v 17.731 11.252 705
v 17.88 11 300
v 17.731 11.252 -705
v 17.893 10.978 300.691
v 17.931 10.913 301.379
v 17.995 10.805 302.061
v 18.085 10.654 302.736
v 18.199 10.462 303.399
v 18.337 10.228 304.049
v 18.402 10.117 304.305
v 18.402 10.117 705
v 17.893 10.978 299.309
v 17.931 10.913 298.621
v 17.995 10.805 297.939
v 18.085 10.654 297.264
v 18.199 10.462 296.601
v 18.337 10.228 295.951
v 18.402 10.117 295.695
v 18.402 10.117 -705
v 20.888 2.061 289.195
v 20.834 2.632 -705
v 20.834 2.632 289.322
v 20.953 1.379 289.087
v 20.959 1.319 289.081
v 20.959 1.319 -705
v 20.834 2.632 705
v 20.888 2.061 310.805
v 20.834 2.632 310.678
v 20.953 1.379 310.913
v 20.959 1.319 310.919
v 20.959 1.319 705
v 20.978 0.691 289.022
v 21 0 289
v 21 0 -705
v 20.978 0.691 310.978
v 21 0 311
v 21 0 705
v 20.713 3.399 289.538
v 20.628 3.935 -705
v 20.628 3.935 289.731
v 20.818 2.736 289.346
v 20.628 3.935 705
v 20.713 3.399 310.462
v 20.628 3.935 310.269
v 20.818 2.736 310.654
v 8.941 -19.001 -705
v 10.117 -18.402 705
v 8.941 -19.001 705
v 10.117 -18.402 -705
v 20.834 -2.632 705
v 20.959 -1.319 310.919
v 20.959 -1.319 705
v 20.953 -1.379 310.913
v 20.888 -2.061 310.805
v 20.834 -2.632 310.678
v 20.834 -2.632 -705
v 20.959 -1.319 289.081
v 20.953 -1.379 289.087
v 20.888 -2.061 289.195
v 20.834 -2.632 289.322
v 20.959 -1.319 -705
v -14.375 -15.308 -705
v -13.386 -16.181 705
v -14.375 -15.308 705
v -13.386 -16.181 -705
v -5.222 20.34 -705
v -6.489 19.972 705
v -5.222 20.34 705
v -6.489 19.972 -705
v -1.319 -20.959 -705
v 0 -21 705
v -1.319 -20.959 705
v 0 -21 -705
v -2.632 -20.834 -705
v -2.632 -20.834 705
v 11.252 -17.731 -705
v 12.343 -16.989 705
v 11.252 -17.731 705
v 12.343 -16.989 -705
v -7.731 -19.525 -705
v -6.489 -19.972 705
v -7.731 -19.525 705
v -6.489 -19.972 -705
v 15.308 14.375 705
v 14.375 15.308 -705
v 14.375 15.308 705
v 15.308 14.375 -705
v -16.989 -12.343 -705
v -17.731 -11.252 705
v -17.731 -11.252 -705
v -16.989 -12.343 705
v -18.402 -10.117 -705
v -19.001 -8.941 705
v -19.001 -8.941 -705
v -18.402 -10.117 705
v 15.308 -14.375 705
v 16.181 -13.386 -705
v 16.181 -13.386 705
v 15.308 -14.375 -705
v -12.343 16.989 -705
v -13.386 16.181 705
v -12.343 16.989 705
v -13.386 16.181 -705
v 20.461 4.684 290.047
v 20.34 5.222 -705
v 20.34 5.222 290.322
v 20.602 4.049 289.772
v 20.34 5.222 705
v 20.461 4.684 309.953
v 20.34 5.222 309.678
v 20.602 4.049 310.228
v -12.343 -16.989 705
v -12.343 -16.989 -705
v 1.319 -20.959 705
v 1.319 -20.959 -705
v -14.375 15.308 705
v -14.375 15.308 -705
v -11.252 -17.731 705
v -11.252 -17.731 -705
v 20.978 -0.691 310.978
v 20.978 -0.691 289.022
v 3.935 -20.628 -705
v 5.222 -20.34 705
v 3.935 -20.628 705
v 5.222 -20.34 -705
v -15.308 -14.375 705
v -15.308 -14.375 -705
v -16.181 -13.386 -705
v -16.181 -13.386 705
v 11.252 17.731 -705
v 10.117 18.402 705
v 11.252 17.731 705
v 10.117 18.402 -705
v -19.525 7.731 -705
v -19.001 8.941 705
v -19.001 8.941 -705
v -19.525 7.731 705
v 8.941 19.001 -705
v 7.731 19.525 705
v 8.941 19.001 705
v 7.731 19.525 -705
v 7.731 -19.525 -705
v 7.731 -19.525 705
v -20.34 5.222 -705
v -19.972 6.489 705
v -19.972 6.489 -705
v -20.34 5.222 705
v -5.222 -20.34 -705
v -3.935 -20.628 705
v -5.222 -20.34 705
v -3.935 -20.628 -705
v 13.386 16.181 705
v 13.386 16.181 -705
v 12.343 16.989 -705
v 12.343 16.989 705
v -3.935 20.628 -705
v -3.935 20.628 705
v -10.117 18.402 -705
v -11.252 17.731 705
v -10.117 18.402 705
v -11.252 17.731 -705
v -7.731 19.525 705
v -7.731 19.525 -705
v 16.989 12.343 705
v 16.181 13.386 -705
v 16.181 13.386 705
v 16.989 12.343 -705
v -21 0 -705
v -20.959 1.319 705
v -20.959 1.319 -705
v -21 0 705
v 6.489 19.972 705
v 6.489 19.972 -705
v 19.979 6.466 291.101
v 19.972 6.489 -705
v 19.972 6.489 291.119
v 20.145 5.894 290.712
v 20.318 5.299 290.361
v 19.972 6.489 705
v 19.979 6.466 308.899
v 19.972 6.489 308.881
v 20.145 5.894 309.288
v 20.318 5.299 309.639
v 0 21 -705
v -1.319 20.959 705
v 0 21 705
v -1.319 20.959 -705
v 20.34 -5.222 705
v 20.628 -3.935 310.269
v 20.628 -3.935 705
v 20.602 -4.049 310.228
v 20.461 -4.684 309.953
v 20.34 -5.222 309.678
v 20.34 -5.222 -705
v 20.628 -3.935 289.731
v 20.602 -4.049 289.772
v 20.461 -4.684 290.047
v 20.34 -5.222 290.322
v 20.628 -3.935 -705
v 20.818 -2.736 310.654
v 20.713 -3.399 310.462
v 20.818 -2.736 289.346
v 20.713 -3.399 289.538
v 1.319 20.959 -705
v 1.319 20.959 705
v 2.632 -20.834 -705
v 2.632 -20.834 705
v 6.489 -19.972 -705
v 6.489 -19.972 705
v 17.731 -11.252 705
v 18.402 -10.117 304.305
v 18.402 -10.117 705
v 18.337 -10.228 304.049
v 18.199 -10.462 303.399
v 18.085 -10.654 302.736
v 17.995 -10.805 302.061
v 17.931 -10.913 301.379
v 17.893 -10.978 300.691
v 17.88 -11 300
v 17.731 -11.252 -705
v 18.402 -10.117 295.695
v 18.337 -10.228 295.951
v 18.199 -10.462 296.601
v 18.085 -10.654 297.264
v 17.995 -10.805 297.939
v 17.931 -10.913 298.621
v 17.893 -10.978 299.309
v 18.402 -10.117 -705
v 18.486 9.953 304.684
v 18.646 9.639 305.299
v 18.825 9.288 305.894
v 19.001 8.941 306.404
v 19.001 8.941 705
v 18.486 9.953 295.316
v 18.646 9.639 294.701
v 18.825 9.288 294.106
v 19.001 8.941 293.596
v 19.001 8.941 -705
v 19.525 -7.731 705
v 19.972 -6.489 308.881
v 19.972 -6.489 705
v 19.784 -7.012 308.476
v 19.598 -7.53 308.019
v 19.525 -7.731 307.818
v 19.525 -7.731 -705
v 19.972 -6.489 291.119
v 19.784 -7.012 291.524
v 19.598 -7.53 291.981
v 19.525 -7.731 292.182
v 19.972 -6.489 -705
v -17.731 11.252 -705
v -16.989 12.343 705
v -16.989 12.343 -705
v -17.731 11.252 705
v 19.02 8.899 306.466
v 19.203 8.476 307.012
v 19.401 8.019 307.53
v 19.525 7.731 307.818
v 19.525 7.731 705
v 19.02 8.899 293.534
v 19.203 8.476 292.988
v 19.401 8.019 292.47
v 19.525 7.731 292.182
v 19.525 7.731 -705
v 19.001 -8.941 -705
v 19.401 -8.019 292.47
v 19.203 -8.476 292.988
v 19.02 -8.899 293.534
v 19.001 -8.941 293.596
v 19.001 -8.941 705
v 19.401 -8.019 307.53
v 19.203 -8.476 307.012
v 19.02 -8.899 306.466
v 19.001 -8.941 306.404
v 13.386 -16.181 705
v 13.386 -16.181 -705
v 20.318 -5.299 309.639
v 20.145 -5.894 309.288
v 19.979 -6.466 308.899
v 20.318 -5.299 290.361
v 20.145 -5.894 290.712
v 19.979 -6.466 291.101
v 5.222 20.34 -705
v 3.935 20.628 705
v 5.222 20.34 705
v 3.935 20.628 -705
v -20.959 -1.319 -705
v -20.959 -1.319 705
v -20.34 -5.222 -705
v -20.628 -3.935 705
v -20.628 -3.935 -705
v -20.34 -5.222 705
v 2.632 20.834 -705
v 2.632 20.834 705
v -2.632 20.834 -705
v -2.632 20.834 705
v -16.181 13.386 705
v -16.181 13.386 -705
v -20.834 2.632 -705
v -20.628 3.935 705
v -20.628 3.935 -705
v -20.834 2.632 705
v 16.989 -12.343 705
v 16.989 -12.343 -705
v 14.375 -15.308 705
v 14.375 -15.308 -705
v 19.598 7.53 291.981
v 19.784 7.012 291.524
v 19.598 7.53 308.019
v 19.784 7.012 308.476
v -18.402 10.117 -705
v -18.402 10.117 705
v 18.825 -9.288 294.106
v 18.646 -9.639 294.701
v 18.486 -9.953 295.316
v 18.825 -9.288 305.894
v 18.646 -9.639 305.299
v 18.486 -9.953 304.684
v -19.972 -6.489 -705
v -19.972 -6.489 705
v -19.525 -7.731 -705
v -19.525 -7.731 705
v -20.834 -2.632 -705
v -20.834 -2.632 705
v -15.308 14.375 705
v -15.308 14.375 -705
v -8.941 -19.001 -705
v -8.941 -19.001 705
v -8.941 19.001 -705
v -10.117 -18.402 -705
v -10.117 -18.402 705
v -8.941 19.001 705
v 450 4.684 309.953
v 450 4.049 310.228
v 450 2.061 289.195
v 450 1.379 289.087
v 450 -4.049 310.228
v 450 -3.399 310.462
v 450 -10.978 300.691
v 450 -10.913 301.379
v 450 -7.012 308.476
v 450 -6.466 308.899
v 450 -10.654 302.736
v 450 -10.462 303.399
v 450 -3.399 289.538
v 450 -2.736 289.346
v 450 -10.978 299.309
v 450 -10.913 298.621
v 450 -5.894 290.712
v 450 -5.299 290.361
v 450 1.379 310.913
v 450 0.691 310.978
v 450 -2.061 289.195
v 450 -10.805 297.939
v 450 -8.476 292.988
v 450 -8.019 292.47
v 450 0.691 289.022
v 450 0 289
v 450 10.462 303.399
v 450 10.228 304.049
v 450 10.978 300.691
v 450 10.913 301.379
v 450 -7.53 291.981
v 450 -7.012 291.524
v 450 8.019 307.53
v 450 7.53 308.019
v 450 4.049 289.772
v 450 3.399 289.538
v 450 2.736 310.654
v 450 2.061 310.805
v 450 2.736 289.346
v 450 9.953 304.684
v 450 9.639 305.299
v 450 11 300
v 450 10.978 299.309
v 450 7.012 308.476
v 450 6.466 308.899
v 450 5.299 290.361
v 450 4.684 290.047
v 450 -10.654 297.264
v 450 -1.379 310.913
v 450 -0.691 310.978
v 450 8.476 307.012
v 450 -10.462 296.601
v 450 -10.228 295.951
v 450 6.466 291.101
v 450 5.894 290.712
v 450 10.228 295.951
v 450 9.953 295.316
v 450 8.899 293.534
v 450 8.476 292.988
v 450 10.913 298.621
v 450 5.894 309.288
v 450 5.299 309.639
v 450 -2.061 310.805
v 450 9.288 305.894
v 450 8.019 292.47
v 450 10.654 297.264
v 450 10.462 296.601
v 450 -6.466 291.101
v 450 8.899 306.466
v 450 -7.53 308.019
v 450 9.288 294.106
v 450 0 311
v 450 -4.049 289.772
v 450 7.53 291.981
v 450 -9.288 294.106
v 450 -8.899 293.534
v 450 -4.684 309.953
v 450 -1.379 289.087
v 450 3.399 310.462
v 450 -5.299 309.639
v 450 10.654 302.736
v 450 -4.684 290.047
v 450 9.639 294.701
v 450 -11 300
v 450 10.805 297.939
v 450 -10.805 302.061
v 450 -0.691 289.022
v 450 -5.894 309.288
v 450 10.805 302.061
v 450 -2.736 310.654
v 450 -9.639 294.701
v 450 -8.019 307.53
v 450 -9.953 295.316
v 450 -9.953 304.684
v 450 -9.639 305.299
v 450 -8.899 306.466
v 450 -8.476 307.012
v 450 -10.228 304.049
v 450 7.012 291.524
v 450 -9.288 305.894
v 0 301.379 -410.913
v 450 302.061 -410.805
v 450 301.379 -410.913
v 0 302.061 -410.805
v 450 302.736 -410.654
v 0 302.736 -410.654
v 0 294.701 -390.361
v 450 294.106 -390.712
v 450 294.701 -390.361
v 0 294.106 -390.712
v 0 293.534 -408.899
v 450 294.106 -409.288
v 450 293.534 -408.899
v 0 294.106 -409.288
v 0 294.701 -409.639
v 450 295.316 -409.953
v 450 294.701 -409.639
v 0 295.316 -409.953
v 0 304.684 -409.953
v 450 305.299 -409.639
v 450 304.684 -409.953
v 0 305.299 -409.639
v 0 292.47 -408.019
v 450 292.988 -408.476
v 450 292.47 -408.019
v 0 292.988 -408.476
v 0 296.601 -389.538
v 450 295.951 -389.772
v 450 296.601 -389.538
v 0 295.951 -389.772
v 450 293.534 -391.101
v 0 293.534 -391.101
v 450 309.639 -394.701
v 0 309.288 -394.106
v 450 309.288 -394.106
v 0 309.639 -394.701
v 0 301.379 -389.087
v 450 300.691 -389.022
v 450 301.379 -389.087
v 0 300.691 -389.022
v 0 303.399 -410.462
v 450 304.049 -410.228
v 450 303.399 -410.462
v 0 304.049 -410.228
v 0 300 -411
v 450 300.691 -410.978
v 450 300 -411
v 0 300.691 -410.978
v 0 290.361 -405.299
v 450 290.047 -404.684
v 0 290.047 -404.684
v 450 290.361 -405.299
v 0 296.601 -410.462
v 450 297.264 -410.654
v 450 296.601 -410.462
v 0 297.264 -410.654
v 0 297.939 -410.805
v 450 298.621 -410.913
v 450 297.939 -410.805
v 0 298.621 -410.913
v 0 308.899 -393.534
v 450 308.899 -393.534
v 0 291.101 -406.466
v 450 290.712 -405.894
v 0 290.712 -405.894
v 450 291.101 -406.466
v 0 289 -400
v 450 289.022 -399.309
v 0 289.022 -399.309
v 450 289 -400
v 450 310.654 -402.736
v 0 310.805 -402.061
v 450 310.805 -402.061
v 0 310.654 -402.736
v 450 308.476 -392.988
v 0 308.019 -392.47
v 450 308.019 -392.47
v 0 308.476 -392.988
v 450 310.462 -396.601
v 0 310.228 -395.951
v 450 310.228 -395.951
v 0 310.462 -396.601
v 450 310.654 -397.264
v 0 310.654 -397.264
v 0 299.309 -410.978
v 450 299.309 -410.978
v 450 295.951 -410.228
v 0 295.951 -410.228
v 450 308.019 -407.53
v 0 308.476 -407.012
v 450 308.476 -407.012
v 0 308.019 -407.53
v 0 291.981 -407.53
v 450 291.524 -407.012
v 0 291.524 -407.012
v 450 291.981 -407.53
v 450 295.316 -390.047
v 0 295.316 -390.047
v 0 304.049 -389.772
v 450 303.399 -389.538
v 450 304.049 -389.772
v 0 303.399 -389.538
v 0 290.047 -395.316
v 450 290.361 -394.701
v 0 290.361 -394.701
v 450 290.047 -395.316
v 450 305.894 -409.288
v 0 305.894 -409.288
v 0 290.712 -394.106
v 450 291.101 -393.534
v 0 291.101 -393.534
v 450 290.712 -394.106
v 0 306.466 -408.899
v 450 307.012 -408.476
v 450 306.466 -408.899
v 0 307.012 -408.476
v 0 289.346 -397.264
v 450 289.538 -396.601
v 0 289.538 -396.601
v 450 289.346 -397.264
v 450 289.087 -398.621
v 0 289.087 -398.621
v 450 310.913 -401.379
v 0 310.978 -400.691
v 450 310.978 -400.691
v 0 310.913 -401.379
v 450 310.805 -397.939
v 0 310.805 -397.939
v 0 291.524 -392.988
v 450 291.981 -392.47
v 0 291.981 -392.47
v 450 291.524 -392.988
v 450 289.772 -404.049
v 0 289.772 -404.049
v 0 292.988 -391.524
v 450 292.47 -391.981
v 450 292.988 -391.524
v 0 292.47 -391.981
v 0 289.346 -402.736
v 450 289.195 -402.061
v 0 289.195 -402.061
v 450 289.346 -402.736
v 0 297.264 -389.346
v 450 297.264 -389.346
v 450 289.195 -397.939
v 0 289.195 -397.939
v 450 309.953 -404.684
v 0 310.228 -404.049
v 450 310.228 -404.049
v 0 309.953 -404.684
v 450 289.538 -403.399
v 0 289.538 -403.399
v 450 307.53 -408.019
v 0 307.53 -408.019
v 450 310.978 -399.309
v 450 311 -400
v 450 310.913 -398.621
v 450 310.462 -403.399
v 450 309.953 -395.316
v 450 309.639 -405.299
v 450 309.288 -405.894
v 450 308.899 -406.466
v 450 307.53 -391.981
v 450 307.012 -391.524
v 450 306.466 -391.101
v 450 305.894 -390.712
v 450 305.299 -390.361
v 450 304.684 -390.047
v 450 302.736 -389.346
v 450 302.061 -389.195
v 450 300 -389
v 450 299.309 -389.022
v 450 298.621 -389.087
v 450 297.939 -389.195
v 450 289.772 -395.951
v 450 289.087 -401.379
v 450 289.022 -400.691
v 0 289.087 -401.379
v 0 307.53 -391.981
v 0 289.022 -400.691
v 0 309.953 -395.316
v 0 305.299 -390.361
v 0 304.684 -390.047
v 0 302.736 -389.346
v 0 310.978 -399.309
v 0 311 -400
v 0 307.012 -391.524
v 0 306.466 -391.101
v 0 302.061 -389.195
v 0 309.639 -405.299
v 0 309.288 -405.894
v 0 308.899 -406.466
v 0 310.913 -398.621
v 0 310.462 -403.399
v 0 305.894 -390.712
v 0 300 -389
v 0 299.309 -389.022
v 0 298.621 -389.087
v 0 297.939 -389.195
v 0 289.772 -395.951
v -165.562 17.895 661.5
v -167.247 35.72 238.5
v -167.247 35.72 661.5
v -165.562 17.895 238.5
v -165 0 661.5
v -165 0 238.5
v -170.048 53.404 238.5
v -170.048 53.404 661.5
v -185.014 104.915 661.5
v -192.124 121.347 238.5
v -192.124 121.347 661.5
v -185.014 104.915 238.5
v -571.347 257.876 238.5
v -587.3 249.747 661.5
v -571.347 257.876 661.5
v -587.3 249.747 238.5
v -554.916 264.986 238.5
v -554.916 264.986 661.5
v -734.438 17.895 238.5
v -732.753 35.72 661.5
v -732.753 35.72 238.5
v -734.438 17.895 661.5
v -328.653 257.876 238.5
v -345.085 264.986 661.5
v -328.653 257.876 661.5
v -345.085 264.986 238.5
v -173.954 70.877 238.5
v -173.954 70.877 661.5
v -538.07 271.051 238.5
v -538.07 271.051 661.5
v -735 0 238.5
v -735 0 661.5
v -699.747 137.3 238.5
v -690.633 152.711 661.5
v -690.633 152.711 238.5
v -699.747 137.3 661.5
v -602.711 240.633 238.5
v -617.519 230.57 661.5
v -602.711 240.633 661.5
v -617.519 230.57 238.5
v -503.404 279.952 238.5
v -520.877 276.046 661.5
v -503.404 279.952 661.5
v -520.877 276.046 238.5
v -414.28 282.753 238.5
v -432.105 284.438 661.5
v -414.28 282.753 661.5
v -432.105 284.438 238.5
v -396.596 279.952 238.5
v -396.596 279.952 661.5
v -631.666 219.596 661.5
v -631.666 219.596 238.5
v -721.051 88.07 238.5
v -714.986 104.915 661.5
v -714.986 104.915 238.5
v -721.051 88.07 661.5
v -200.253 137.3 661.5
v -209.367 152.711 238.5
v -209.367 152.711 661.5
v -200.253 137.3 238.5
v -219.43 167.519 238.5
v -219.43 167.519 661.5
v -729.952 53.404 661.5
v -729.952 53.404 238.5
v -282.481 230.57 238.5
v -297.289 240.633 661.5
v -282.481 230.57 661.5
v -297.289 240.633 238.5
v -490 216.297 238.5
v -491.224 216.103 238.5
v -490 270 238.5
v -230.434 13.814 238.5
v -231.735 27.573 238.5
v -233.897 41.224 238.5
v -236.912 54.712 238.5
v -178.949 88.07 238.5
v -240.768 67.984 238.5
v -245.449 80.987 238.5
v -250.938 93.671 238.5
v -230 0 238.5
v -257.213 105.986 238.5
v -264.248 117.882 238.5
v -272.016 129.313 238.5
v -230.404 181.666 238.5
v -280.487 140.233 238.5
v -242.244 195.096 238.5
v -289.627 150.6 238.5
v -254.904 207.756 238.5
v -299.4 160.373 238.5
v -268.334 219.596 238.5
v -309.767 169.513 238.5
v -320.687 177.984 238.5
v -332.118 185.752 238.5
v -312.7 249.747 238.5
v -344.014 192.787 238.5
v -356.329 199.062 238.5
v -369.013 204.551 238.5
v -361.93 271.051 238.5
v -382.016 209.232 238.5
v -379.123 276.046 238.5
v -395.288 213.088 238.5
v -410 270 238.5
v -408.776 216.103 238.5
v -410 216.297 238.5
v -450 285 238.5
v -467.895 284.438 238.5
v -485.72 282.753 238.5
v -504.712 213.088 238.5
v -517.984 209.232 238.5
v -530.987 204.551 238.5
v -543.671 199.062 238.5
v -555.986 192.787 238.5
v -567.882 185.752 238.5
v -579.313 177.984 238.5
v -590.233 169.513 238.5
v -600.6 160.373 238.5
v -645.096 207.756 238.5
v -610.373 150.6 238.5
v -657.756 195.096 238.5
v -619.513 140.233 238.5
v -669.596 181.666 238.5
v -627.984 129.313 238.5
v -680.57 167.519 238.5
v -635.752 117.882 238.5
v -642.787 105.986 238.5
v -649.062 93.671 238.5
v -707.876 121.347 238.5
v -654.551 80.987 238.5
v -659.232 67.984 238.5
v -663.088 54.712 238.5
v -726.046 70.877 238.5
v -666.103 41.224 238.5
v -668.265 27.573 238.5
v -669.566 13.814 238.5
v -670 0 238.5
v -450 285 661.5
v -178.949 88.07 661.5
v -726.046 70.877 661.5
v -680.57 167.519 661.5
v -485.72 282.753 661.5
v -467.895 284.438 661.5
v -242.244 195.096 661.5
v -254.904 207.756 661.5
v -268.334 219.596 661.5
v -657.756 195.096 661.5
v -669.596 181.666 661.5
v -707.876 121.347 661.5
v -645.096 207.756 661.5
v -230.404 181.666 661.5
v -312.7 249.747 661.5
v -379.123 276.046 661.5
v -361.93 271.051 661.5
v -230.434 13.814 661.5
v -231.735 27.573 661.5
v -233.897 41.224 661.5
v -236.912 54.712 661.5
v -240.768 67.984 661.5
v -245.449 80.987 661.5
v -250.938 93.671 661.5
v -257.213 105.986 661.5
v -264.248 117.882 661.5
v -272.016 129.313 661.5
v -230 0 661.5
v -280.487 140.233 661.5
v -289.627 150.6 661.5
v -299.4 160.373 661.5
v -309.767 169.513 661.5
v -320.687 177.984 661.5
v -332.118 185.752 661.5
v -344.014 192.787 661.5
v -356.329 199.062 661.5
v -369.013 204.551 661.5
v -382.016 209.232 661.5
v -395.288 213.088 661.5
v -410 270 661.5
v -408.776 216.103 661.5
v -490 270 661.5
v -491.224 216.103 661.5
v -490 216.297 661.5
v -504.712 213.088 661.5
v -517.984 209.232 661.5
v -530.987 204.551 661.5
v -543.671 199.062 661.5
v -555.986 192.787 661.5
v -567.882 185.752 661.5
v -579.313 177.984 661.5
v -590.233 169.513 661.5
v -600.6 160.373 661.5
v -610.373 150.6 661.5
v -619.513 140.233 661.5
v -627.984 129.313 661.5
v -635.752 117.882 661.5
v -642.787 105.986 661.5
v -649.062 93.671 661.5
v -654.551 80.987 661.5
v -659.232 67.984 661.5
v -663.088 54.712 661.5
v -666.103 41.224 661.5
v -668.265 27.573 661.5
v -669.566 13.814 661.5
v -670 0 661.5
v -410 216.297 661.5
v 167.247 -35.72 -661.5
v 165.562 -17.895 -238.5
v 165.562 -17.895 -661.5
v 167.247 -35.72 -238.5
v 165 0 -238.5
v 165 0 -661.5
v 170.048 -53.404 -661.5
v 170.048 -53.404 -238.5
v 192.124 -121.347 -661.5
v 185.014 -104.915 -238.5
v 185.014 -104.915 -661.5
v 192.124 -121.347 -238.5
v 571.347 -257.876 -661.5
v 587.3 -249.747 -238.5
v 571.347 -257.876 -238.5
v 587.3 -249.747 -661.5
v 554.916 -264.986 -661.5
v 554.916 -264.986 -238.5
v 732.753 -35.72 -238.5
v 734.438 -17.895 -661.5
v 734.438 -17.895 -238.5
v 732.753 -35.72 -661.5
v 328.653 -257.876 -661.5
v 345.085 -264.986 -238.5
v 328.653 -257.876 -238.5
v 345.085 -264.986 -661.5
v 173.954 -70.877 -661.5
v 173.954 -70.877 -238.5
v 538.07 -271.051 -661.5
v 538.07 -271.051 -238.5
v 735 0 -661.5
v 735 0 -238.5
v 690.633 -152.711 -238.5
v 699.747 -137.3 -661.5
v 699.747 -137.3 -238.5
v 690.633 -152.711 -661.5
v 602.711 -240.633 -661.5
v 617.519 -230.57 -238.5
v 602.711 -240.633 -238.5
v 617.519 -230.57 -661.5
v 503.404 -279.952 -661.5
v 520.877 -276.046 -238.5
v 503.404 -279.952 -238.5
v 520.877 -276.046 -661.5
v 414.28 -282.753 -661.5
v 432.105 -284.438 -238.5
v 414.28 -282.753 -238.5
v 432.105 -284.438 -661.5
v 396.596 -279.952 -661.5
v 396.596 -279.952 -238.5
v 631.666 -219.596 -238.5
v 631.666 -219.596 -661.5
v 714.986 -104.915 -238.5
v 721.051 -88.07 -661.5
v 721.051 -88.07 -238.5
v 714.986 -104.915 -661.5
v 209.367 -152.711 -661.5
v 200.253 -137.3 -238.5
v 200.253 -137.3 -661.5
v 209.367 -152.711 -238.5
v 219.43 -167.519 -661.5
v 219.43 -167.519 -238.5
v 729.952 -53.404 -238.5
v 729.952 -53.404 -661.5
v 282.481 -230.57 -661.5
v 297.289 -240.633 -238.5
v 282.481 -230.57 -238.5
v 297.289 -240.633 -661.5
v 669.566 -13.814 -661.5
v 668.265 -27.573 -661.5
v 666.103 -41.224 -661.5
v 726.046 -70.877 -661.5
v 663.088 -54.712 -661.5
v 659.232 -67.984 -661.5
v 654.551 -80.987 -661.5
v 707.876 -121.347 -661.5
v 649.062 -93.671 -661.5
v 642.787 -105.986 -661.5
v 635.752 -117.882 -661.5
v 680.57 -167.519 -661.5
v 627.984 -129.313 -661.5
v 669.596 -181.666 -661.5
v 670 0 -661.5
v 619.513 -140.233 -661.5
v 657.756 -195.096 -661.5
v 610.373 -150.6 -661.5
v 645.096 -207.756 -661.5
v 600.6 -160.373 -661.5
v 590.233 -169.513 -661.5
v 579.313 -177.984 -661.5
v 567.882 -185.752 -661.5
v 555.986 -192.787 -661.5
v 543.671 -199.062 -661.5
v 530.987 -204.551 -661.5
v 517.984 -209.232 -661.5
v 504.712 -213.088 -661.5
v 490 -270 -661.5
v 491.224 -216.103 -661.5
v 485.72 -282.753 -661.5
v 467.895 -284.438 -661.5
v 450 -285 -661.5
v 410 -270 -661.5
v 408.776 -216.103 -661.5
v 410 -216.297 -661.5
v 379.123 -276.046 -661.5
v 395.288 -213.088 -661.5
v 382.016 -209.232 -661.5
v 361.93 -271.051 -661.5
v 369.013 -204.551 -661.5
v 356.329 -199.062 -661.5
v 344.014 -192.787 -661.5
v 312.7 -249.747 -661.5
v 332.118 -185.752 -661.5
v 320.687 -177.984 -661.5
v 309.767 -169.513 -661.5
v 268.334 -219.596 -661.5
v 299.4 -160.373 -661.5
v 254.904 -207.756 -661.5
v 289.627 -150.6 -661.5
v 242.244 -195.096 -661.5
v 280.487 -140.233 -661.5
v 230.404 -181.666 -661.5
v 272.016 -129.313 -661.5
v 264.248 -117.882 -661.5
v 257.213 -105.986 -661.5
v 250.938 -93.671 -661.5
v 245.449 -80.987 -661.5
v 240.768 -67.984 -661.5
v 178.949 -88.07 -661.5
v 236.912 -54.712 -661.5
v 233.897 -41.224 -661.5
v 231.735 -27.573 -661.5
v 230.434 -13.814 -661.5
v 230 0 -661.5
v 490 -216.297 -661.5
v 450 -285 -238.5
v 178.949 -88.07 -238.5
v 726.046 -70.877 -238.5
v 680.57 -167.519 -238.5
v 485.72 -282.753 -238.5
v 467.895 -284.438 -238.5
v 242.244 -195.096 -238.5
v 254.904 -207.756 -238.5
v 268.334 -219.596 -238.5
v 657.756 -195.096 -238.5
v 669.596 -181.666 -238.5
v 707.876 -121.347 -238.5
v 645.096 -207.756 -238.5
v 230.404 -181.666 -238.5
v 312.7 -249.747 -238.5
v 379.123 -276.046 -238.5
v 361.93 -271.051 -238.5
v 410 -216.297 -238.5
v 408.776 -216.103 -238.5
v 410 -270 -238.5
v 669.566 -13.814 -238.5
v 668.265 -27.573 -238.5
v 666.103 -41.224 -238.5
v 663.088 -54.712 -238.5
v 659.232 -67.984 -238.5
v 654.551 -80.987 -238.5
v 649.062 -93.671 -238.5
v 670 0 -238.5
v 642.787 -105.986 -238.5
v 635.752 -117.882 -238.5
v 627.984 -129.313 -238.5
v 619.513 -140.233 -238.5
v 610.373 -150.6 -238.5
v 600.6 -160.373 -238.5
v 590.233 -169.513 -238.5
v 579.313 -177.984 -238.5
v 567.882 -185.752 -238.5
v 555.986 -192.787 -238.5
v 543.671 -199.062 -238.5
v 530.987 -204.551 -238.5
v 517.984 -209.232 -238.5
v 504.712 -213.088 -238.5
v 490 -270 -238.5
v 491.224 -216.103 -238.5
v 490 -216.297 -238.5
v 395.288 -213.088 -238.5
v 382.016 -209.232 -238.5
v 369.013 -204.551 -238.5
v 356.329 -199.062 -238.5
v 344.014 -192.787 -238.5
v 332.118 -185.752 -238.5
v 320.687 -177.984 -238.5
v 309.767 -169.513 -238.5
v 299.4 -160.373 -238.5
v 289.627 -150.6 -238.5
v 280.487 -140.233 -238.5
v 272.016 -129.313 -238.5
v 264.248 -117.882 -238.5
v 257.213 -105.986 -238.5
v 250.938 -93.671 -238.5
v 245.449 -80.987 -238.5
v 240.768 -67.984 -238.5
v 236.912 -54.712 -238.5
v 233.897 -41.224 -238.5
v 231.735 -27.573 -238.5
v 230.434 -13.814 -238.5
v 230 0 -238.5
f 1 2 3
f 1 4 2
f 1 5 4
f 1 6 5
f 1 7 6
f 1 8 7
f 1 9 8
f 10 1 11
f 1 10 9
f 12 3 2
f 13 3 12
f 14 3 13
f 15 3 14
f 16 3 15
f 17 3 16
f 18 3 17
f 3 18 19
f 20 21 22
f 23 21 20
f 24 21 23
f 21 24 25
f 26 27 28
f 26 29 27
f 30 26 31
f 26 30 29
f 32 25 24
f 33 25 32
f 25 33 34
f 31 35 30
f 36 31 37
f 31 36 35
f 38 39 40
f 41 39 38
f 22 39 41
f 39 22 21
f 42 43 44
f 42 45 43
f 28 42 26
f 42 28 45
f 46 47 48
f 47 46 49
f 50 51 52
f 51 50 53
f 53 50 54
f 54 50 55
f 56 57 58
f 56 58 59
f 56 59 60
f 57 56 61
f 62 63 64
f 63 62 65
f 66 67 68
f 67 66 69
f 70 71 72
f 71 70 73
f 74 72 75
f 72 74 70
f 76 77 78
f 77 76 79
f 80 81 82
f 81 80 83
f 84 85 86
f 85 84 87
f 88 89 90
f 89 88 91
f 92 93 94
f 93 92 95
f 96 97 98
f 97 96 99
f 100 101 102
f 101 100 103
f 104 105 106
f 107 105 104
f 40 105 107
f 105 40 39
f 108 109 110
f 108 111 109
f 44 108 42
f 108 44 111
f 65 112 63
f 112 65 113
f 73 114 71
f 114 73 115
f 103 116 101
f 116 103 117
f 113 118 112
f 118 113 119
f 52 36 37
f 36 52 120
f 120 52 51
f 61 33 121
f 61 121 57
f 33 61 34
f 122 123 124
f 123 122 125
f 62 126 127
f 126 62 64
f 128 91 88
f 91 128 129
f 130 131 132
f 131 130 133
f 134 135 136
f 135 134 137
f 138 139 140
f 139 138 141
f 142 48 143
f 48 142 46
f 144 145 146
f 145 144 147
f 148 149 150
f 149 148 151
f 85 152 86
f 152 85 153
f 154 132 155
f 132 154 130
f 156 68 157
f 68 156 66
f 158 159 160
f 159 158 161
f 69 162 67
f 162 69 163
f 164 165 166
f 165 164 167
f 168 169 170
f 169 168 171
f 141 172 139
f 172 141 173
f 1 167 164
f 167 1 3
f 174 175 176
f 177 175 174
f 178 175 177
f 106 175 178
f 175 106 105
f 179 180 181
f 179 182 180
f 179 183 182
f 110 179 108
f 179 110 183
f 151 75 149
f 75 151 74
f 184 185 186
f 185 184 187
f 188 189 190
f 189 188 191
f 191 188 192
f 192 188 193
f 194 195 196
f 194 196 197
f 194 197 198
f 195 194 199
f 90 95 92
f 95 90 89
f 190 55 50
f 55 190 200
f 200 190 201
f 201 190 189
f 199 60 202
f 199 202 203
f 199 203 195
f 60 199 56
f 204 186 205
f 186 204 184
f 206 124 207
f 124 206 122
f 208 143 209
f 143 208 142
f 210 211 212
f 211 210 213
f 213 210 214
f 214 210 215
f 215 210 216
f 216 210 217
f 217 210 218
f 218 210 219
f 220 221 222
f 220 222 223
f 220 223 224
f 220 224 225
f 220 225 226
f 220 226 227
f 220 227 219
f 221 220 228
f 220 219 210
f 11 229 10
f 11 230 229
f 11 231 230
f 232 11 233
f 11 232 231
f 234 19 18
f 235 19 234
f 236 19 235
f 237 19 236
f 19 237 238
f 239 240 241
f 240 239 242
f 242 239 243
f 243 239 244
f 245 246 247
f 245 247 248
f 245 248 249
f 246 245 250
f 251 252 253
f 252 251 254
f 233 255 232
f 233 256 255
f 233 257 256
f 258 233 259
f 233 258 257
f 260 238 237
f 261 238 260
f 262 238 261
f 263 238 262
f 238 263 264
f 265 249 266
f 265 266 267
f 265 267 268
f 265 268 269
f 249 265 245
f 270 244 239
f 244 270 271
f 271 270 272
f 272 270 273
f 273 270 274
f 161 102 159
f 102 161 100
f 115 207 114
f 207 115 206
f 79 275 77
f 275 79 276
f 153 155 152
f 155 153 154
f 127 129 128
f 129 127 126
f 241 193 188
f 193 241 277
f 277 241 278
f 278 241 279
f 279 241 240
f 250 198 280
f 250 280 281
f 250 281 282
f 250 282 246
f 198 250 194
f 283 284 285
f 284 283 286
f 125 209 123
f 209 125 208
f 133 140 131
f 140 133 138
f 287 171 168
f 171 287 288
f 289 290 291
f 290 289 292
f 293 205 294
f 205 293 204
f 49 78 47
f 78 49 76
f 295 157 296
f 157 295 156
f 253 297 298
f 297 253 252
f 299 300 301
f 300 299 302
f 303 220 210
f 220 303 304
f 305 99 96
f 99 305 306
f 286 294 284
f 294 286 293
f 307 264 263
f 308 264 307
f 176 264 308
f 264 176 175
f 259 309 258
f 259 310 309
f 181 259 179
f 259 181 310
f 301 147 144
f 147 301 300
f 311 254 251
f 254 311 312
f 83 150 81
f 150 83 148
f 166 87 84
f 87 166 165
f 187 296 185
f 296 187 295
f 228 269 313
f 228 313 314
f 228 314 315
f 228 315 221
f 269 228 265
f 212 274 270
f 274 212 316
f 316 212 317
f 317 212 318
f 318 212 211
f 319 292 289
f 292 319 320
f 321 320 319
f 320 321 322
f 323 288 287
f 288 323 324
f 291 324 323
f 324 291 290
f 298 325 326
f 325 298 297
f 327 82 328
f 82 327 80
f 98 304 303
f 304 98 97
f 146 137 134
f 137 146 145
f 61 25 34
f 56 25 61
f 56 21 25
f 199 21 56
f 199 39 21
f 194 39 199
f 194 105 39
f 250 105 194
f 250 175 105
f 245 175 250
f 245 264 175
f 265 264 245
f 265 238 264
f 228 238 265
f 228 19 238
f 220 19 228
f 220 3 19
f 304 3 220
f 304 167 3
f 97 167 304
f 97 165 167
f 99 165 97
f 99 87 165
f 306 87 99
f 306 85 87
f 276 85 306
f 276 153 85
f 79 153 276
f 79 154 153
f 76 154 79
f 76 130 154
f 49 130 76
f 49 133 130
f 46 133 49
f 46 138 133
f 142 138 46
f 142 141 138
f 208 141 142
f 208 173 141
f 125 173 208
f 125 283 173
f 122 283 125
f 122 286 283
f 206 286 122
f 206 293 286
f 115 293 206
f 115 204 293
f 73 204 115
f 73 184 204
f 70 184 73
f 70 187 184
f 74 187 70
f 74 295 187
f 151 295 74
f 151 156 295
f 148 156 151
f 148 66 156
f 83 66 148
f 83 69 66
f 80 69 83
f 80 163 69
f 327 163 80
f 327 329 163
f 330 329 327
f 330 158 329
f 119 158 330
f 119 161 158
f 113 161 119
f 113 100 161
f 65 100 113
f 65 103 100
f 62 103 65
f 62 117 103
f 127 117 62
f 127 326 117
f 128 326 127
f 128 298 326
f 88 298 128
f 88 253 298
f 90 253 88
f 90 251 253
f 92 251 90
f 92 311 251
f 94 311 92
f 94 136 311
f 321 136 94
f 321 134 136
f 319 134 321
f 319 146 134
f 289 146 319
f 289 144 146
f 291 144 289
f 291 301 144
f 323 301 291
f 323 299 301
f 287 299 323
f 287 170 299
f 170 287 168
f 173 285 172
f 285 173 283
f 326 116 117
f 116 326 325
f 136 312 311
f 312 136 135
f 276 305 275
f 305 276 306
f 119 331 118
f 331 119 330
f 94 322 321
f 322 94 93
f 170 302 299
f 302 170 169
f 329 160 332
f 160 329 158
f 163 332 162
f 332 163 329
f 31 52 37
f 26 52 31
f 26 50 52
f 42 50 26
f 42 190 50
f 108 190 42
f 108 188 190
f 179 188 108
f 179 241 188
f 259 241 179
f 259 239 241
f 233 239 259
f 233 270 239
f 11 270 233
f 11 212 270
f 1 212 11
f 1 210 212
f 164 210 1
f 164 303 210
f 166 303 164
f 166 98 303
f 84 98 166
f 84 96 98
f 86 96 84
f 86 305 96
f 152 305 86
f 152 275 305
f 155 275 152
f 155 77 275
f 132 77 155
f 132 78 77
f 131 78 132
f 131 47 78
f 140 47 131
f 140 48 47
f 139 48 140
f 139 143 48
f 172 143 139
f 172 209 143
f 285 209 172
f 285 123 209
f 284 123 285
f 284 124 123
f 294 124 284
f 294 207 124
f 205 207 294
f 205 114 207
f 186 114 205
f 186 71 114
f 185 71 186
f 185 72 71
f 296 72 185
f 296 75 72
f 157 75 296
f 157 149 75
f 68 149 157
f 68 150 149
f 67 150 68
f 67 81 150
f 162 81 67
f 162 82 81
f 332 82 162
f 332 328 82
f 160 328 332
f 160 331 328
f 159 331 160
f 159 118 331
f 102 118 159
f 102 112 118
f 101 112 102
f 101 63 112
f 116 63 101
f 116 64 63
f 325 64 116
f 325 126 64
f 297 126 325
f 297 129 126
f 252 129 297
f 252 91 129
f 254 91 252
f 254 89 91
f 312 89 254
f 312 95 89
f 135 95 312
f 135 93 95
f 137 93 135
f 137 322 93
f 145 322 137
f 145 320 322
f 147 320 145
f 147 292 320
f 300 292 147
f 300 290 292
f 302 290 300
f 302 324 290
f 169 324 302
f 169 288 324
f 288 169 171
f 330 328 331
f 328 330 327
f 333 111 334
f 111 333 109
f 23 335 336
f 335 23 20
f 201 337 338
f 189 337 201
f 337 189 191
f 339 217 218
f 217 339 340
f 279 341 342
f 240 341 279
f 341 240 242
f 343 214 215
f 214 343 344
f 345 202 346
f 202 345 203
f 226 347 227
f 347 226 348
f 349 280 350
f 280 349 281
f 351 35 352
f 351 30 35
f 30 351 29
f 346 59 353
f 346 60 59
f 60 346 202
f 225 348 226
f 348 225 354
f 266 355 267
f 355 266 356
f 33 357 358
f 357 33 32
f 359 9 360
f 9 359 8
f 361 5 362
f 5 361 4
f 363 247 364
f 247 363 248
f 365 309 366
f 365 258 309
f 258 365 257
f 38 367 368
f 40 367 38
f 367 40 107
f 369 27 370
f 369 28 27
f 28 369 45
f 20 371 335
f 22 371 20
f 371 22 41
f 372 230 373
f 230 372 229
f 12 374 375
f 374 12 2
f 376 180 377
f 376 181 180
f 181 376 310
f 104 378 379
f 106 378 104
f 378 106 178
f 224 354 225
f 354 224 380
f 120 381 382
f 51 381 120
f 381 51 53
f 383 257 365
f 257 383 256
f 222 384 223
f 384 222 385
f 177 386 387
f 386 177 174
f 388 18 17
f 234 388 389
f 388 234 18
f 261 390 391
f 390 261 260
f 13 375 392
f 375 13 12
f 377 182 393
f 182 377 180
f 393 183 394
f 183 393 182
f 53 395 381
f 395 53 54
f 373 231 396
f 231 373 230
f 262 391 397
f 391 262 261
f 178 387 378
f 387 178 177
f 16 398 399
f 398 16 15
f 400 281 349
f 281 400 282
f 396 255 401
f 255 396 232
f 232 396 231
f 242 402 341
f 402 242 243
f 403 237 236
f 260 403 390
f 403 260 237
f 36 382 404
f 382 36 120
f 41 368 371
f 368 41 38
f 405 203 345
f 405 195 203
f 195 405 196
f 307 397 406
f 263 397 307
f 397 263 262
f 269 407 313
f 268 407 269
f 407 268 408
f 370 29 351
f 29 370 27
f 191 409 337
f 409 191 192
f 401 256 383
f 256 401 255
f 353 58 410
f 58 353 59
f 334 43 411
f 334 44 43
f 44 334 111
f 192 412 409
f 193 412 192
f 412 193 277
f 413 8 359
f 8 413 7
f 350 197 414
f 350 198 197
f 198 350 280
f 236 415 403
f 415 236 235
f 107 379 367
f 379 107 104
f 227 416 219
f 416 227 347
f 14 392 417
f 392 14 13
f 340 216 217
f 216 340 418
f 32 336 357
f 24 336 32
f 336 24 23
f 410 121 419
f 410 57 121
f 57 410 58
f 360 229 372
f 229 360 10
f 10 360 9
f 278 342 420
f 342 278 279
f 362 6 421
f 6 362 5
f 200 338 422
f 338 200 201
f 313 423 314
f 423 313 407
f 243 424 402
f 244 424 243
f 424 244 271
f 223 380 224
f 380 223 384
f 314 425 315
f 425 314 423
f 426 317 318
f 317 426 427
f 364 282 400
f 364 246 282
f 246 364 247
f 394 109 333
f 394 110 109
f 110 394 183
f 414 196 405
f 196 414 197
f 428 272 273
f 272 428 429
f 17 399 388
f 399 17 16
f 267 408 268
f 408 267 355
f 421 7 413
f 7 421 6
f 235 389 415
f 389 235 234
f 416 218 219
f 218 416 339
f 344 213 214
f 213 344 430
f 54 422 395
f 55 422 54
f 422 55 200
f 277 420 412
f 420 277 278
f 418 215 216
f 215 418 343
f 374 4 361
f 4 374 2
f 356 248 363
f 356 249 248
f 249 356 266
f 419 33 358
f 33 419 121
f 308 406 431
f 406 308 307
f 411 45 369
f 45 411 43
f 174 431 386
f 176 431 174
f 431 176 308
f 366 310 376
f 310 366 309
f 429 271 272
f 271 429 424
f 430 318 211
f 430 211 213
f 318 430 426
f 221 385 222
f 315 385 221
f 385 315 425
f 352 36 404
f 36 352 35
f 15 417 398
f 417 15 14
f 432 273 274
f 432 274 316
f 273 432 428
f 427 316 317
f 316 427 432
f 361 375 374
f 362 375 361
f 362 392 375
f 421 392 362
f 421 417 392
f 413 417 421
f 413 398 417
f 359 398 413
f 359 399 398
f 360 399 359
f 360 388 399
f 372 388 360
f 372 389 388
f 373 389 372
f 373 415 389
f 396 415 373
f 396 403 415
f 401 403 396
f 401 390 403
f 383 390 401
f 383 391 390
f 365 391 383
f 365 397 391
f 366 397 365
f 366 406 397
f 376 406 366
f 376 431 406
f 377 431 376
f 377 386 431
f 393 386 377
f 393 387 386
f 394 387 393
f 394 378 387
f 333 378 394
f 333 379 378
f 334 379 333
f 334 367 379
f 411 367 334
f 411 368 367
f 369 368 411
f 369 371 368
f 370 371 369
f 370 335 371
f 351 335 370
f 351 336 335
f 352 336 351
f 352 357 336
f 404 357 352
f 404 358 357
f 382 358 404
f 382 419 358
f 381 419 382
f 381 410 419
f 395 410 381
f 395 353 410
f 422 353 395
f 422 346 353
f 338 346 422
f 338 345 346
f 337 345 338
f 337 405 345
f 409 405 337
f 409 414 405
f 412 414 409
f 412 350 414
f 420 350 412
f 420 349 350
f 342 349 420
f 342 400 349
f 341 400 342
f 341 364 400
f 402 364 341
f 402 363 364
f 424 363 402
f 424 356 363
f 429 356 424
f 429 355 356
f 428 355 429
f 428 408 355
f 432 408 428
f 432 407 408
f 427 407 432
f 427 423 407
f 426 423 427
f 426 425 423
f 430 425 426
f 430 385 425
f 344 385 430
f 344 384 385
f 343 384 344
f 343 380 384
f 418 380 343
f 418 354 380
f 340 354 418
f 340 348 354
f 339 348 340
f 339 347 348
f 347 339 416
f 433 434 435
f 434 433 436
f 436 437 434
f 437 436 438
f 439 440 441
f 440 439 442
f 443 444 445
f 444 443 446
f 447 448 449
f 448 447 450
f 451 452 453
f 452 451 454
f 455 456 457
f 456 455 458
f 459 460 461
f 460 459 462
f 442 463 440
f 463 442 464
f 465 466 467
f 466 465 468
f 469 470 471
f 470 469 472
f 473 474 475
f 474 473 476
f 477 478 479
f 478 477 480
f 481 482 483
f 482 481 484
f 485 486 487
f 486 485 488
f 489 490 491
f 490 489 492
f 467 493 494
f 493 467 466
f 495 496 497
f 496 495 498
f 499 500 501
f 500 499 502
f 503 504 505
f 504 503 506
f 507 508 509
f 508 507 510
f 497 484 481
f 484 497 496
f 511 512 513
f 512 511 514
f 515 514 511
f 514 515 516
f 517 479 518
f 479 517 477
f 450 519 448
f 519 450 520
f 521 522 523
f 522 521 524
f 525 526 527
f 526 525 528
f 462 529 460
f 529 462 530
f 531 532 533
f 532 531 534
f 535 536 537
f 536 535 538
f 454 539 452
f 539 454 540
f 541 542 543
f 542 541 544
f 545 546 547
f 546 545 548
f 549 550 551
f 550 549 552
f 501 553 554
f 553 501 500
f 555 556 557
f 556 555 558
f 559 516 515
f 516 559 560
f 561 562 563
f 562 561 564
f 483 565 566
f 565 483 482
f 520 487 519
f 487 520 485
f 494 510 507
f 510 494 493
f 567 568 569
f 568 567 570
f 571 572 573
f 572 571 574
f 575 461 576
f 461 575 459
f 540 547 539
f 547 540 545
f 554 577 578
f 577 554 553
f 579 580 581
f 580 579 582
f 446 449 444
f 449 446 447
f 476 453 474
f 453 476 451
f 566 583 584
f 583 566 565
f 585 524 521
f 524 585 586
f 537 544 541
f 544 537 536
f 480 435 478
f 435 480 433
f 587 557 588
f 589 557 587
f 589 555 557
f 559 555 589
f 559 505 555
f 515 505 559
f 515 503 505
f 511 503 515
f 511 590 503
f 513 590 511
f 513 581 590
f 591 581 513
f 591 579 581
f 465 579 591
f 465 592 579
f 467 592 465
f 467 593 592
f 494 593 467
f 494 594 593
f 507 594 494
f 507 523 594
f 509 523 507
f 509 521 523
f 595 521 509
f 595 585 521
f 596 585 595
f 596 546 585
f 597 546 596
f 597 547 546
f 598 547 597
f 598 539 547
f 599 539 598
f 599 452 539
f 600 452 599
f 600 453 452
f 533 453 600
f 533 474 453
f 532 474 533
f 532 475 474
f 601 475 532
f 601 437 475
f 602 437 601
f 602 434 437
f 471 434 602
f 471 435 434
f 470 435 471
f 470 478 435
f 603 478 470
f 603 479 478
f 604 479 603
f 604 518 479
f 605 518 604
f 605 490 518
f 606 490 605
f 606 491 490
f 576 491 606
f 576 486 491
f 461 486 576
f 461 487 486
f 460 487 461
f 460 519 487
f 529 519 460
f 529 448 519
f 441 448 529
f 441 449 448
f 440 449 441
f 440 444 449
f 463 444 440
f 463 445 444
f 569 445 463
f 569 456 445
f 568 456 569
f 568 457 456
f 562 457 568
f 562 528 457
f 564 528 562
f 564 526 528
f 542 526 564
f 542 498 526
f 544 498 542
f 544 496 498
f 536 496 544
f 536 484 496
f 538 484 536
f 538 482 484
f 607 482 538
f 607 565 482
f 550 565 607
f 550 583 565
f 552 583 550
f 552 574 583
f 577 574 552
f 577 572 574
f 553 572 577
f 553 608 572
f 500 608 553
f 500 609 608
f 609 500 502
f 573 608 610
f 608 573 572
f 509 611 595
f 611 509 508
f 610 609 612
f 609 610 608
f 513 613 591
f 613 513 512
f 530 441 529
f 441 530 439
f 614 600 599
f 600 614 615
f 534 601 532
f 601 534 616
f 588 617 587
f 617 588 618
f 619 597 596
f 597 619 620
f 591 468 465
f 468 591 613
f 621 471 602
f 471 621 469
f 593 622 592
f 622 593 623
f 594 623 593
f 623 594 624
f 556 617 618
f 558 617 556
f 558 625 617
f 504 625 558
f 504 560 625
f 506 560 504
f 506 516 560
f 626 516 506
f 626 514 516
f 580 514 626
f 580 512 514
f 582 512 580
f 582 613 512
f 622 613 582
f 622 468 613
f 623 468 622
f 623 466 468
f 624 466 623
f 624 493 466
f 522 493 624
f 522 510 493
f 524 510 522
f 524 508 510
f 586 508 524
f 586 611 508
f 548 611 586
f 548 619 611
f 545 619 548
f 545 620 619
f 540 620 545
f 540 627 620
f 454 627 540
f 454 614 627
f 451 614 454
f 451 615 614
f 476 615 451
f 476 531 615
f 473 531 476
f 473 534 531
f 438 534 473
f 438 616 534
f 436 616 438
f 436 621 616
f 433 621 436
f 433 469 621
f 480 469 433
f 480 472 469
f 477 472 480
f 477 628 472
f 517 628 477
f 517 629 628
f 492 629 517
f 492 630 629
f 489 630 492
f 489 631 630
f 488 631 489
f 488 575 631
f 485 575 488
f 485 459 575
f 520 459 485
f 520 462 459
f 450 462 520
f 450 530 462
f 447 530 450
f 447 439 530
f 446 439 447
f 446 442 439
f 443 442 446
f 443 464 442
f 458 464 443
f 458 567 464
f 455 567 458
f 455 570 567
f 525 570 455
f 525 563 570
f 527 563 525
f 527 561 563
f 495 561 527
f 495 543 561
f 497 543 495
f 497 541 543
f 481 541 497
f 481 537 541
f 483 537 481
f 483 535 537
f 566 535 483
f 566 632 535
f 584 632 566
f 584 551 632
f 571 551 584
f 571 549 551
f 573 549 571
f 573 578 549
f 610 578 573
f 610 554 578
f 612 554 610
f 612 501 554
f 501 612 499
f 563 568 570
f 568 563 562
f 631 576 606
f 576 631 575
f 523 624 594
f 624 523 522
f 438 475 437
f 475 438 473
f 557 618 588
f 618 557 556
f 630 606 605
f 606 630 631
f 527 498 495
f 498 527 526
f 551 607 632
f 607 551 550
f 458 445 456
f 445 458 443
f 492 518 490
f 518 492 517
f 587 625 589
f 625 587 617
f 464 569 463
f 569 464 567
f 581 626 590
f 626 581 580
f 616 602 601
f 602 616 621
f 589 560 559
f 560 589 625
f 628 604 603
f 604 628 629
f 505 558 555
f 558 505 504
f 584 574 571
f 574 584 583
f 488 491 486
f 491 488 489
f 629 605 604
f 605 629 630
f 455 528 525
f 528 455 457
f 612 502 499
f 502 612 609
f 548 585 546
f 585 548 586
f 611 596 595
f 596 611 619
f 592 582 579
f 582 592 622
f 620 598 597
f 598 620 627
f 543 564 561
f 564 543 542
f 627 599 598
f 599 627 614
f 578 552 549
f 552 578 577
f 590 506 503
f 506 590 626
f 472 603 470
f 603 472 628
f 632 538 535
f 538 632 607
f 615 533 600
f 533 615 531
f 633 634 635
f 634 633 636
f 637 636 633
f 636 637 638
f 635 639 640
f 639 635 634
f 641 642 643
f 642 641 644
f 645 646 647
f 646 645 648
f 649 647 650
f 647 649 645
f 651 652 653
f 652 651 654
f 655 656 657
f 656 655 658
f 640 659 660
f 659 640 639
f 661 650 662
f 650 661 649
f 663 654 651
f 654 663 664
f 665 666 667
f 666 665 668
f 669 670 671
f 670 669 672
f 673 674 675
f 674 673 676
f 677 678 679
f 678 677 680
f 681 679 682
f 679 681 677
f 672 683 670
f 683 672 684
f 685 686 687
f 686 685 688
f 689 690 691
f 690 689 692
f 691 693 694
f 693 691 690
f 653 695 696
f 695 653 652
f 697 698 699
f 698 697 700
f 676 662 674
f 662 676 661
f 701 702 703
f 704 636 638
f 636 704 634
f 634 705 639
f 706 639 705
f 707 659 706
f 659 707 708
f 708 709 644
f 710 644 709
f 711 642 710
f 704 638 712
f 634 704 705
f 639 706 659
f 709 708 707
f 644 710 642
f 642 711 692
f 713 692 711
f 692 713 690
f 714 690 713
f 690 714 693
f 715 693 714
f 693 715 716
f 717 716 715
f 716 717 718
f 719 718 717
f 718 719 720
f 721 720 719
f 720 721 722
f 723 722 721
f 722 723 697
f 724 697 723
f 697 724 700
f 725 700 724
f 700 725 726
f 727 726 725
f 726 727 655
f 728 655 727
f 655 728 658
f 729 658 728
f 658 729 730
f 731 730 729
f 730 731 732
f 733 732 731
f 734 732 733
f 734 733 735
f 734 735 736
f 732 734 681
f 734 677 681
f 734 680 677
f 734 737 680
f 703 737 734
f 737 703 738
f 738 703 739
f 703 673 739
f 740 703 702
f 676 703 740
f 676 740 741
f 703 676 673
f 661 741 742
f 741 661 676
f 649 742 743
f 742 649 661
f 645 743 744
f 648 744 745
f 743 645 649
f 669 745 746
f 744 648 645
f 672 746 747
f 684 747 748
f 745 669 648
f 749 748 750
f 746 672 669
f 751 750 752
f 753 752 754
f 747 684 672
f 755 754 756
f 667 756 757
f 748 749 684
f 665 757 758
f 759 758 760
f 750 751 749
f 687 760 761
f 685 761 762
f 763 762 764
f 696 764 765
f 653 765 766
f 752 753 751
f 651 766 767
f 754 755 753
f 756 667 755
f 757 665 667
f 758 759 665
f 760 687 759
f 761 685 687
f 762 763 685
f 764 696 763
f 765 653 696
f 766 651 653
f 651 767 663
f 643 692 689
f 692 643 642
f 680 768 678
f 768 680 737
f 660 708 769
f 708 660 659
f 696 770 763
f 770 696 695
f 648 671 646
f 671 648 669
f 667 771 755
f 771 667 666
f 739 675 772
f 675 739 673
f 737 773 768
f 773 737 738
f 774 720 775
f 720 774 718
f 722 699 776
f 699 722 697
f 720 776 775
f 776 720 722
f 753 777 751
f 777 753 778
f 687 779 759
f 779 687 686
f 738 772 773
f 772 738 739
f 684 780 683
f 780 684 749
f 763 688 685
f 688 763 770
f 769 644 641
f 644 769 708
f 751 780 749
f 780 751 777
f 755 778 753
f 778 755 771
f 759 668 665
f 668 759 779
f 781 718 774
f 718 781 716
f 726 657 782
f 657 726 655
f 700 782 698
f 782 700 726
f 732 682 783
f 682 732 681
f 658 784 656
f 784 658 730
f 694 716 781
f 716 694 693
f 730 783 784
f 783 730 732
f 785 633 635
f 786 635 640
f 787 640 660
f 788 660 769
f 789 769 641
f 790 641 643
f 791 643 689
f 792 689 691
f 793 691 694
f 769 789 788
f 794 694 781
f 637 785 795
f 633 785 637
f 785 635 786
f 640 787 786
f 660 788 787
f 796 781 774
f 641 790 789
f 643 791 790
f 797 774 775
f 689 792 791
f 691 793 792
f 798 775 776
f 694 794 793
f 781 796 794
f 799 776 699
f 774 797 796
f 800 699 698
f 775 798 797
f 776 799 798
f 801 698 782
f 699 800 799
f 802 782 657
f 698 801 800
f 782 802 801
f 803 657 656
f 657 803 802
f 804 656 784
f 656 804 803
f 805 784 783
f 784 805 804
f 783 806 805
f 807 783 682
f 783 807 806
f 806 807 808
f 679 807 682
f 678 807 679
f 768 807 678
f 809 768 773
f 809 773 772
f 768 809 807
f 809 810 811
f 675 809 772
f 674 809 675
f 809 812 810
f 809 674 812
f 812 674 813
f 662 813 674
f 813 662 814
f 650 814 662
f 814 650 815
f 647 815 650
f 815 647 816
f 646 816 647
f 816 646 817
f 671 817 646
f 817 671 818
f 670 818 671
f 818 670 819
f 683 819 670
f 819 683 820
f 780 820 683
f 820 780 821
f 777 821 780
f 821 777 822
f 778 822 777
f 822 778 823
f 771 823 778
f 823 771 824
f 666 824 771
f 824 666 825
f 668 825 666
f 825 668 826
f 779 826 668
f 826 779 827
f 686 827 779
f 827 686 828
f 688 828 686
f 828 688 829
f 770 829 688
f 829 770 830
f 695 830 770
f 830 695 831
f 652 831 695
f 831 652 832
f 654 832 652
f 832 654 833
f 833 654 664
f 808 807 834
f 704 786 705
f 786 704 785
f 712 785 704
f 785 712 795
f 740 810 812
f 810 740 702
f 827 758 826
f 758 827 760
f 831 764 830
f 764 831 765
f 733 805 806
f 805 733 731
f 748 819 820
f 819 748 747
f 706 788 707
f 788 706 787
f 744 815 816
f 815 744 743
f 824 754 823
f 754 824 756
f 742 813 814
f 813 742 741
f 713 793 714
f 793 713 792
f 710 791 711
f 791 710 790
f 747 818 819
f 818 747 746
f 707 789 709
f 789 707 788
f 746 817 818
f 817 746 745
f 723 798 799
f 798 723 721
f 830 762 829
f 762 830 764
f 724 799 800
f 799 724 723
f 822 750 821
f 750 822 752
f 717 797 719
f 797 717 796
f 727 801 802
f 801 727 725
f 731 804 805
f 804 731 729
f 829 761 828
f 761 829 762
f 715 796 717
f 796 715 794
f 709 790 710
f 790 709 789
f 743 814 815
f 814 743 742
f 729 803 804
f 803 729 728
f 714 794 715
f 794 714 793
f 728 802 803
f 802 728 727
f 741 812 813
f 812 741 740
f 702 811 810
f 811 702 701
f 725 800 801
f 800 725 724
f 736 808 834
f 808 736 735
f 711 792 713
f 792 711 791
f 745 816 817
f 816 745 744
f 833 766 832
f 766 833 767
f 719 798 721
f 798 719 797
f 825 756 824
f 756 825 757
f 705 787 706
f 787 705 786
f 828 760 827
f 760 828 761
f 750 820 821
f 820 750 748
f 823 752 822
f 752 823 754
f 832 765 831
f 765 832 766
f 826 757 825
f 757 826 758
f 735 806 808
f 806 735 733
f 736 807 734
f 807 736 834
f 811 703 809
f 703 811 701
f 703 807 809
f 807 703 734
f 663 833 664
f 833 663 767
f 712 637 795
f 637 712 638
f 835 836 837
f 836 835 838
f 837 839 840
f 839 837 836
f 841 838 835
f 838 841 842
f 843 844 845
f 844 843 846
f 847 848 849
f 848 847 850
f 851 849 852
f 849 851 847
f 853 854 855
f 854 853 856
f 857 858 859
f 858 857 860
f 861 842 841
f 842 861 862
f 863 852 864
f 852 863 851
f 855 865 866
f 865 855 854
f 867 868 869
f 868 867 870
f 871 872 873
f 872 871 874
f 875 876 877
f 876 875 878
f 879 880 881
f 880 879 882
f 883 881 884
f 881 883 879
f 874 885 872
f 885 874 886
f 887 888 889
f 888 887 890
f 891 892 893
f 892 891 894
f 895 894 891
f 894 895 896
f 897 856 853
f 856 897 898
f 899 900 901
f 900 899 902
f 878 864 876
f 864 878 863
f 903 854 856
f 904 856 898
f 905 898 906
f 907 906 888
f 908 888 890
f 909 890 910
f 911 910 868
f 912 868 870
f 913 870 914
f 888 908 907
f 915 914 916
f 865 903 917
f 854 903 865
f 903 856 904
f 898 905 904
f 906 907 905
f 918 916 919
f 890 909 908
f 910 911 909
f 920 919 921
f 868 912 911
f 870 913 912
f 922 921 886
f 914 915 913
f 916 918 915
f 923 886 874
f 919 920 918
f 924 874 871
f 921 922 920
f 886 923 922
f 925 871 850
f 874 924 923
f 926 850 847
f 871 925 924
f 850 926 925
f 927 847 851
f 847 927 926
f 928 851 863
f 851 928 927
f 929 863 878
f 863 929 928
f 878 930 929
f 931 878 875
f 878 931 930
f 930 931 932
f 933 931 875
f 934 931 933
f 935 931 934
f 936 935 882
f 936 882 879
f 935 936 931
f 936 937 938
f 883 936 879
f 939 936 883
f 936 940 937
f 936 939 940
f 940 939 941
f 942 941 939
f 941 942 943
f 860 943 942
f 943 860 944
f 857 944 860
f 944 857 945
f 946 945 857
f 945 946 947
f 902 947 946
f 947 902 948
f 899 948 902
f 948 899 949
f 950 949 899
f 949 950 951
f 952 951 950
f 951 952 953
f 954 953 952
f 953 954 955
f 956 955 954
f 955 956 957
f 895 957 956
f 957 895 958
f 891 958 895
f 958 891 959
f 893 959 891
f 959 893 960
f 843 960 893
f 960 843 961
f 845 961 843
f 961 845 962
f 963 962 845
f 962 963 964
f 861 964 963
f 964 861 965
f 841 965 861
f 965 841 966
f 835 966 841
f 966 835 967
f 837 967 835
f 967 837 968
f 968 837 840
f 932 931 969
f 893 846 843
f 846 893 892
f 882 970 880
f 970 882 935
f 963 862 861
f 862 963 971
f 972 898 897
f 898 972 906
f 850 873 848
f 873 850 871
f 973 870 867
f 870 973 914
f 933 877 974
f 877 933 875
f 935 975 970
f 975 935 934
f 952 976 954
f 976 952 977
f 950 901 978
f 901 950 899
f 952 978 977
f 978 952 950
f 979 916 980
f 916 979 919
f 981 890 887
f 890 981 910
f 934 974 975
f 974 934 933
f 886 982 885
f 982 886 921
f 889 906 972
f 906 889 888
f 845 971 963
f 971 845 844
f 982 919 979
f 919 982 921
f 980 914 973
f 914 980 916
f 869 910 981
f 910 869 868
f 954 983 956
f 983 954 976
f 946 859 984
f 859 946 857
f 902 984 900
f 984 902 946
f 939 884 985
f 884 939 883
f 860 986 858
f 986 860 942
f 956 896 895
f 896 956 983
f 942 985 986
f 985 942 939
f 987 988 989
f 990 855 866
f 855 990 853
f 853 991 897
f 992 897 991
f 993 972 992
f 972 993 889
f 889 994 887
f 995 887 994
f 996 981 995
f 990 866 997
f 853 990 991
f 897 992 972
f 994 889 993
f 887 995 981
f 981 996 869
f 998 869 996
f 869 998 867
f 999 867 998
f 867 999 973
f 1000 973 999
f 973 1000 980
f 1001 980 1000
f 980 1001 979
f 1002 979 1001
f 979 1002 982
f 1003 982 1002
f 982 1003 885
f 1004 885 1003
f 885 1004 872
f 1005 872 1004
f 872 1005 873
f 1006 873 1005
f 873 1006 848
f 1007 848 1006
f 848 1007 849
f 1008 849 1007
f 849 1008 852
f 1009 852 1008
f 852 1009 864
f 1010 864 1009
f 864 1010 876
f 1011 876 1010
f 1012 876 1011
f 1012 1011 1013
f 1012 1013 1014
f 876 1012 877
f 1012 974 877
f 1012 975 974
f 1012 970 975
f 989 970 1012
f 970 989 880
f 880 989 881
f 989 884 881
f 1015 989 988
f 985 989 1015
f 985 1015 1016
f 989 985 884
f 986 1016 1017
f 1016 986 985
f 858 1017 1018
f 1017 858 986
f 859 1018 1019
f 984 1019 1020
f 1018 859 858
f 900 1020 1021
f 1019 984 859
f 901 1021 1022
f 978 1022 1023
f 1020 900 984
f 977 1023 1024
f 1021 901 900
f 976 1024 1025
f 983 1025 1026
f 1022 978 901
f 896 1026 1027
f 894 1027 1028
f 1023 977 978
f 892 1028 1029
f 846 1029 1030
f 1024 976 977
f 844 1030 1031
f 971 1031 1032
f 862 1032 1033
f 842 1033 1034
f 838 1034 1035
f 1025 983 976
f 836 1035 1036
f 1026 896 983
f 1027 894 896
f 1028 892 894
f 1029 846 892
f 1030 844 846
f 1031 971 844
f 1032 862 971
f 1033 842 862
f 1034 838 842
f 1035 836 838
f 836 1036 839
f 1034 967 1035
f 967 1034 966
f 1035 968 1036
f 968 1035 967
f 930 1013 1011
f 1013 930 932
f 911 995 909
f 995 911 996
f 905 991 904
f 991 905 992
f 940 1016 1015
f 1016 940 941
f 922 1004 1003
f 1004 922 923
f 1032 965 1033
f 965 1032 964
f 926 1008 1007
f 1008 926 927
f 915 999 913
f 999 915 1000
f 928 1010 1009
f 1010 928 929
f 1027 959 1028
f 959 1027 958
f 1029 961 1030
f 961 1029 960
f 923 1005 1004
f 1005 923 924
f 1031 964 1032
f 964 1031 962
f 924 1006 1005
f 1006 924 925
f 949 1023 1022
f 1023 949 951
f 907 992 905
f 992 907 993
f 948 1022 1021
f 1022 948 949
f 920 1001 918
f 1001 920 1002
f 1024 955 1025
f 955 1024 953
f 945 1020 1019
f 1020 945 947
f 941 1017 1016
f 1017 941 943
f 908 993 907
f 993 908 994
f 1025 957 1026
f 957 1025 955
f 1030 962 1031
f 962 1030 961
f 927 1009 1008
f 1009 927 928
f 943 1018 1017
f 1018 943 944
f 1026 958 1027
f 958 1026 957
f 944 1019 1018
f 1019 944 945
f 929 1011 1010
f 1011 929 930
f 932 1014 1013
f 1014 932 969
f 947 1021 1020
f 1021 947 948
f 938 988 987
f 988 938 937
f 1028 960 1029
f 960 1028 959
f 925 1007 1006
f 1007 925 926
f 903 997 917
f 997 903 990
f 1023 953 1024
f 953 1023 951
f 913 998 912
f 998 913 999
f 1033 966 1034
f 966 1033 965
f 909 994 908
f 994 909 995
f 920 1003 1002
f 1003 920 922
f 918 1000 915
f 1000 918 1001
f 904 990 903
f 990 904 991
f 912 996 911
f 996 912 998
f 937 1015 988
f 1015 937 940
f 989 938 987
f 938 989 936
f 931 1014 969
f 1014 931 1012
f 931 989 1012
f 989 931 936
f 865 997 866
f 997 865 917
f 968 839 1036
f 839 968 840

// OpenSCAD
// ============================================================================
// PROJECT: XXXG-00W0 WING GUNDAM ZERO EW - FLIGHT SURFACE INFRA
// COMPONENT VAULT: BANDAI CAST RUNNER E - WING LOCKS E15 & E16
// PACKAGING RE-ARCHITECTURE: SUB-ARMOR CAPACITOR RECESSED BANK INTEGRATION
// CONFIG METRIC: SCALED TITANIUM CASTS (1:1 ACTUAL METRIC UP-SCALE)
// ============================================================================

$fn = 100; // Circular segment rendering resolution count

// Structural Constants Scaled 1:1 for a 16.7-Meter Airframe Scale (mm)
lock_total_length = 940;                 // Total longitudinal vertical height (mm)
pivot_bore_diameter = 440;               // Core cycloidal stabilizer pin width (mm)
armor_skin_thickness = 65;              // Solid TiAl protective plating wall (mm)
harness_conduit_width = 80;             // Cast-in 4oz copper logic trace track (mm)
capacitor_pocket_depth = 15;            // Sub-armor recessed housing pocket depth (mm)
capacitor_pocket_width = 140;           // Transverse MLCC array pocket width (mm)

module Runner_E_Wing_Lock_Forge() {
    // Central Supply Injection Runner Axis (Molten Feed Line from Siphon Forge)
    color([0.22, 0.22, 0.25]) {
        cylinder(h = lock_total_length * 1.5, d = 42, center = true);
        // Direct injection gates tracking straight into the part mold cavities
        translate([0, 0, 300]) rotate([0, 90, 0]) cylinder(h = 450, d = 22);
        translate([0, 300, -400]) rotate([0, 90, 0]) cylinder(h = 450, d = 22);
    }
    
    // Instantiate Scaled Skeutomorphic Part Molds Symmetrically (Left & Right)
    Cast_Internal_Wing_Locks();
}

module Cast_Internal_Wing_Locks() {
    // ---- PART E15: INTERNAL LEFT STRUCTURAL MID-WING FOLDING LOCK ---- [Page 19, Step 11-7]
    translate([-450, 0, 450]) color([0.35, 0.35, 0.38]) { // Inner Frame Dark Spec
        difference() {
            // Main solid heavy-duty core hinge block segment
            cylinder(h = lock_total_length * 0.45, d = pivot_bore_diameter + (armor_skin_thickness * 2), center = true);
            
            // Central Cycloidal Pivot Track Bore (Houses pre-loaded alignment pins)
            cylinder(h = lock_total_length * 0.5, d = pivot_bore_diameter, center = true);
            
            // SUB-ARMOR RECESSED CAPACITOR POCKETS [Segmented rows cut inside the armor inner wall]
            for (z_offset = [-120, 0, 120]) {
                translate([0, (pivot_bore_diameter/2 - armor_skin_thickness + capacitor_pocket_depth/2), z_offset])
                    cube([capacitor_pocket_width, capacitor_pocket_depth, 100], center = true);
            }
            
            // Continuous cast-in routing track for the 4oz solid-state wiring rails
            cube([harness_conduit_width, pivot_bore_diameter + 100, lock_total_length], center = true);
            
            // Slicing profile tool to generate an asymmetrical half-shell part component
            translate([0, -pivot_bore_diameter, 0])
                cube([pivot_bore_diameter * 2, pivot_bore_diameter * 2, lock_total_length * 2], center = true);
        }
    }
    
    // ---- PART E16: INTERNAL RIGHT STRUCTURAL MID-WING FOLDING LOCK ---- [Page 19, Step 11-7]
    translate([450, 0, -450]) rotate([0, 0, 180]) color([0.35, 0.35, 0.38]) {
        difference() {
            cylinder(h = lock_total_length * 0.45, d = pivot_bore_diameter + (armor_skin_thickness * 2), center = true);
            cylinder(h = lock_total_length * 0.5, d = pivot_bore_diameter, center = true);
            
            for (z_offset = [-120, 0, 120]) {
                translate([0, (pivot_bore_diameter/2 - armor_skin_thickness + capacitor_pocket_depth/2), z_offset])
                    cube([capacitor_pocket_width, capacitor_pocket_depth, 100], center = true);
            }
            
            cube([harness_conduit_width, pivot_bore_diameter + 100, lock_total_length], center = true);
            translate([0, -pivot_bore_diameter, 0])
                cube([pivot_bore_diameter * 2, pivot_bore_diameter * 2, lock_total_length * 2], center = true);
        }
    }
}

// Render Master Assembly to Parameter Workspace
Runner_E_Wing_Lock_Forge();
